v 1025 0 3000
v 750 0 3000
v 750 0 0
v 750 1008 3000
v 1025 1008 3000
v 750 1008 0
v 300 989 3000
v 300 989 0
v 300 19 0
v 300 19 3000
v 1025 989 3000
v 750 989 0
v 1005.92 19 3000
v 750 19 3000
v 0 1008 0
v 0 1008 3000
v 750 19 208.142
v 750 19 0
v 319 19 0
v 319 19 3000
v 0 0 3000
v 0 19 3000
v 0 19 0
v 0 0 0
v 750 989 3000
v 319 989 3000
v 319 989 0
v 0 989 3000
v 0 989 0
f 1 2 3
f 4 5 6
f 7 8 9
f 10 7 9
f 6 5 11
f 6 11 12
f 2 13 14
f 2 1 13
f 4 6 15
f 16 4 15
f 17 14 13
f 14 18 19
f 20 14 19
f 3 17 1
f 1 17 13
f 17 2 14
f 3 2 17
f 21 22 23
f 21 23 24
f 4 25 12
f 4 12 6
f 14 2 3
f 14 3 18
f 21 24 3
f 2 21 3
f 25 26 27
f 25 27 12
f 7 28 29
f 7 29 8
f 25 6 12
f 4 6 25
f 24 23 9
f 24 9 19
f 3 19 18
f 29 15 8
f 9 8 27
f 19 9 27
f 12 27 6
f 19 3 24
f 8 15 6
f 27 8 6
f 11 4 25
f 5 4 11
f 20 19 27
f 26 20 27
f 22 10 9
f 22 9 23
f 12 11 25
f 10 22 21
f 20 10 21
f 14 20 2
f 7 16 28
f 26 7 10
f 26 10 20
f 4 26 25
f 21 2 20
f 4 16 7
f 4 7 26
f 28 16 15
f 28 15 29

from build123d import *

# Parameters (mm, degrees)
F1_DEPTH = 3000
F3_DEPTH = 19
F5_DEPTH = 19
F6_SIZE  = 18.99999


# Not quite as in the source:
# - a fillet or chamfer is up to 0.001 mm smaller than in the source, because OpenCascade refuses the exact size


with BuildPart() as f1:
    # F0 (on Top) → F1 (new body)
    with BuildSketch(Plane.XY):
        Polygon((0, 19), (0, 0), (750, 0), (750, 19), (319, 19), (319, 989), (750, 989), (750, 1008), (0, 1008), (0, 989), (300, 989), (300, 19), align=None)
    extrude(amount=F1_DEPTH)


with BuildPart() as f3:
    # F2 (on face) → F3 (new body)
    with BuildSketch(Plane.XZ):
        Polygon((1025, 3000), (750, 3000), (750, 0), align=None)
    extrude(amount=-F3_DEPTH)

    # F6 (size 19 in the source; OpenCascade refuses exactly that, so slightly less here)
    f6_edges = [f3.edges().sort_by_distance(p)[0] for p in [
        (887.5, 19, 1500),
    ]]
    chamfer(f6_edges, length=F6_SIZE)


with BuildPart() as f5:
    # F4 (on face) → F5 (new body)
    with BuildSketch(Plane(origin=(0, 1008, 0), x_dir=(-1, 0, 0), z_dir=(0, 1, 0))):
        Polygon((-750, 0), (-750, 3000), (-1025, 3000), align=None)
    extrude(amount=-F5_DEPTH)


solid = Compound([f1.part, f3.part, f5.part])
